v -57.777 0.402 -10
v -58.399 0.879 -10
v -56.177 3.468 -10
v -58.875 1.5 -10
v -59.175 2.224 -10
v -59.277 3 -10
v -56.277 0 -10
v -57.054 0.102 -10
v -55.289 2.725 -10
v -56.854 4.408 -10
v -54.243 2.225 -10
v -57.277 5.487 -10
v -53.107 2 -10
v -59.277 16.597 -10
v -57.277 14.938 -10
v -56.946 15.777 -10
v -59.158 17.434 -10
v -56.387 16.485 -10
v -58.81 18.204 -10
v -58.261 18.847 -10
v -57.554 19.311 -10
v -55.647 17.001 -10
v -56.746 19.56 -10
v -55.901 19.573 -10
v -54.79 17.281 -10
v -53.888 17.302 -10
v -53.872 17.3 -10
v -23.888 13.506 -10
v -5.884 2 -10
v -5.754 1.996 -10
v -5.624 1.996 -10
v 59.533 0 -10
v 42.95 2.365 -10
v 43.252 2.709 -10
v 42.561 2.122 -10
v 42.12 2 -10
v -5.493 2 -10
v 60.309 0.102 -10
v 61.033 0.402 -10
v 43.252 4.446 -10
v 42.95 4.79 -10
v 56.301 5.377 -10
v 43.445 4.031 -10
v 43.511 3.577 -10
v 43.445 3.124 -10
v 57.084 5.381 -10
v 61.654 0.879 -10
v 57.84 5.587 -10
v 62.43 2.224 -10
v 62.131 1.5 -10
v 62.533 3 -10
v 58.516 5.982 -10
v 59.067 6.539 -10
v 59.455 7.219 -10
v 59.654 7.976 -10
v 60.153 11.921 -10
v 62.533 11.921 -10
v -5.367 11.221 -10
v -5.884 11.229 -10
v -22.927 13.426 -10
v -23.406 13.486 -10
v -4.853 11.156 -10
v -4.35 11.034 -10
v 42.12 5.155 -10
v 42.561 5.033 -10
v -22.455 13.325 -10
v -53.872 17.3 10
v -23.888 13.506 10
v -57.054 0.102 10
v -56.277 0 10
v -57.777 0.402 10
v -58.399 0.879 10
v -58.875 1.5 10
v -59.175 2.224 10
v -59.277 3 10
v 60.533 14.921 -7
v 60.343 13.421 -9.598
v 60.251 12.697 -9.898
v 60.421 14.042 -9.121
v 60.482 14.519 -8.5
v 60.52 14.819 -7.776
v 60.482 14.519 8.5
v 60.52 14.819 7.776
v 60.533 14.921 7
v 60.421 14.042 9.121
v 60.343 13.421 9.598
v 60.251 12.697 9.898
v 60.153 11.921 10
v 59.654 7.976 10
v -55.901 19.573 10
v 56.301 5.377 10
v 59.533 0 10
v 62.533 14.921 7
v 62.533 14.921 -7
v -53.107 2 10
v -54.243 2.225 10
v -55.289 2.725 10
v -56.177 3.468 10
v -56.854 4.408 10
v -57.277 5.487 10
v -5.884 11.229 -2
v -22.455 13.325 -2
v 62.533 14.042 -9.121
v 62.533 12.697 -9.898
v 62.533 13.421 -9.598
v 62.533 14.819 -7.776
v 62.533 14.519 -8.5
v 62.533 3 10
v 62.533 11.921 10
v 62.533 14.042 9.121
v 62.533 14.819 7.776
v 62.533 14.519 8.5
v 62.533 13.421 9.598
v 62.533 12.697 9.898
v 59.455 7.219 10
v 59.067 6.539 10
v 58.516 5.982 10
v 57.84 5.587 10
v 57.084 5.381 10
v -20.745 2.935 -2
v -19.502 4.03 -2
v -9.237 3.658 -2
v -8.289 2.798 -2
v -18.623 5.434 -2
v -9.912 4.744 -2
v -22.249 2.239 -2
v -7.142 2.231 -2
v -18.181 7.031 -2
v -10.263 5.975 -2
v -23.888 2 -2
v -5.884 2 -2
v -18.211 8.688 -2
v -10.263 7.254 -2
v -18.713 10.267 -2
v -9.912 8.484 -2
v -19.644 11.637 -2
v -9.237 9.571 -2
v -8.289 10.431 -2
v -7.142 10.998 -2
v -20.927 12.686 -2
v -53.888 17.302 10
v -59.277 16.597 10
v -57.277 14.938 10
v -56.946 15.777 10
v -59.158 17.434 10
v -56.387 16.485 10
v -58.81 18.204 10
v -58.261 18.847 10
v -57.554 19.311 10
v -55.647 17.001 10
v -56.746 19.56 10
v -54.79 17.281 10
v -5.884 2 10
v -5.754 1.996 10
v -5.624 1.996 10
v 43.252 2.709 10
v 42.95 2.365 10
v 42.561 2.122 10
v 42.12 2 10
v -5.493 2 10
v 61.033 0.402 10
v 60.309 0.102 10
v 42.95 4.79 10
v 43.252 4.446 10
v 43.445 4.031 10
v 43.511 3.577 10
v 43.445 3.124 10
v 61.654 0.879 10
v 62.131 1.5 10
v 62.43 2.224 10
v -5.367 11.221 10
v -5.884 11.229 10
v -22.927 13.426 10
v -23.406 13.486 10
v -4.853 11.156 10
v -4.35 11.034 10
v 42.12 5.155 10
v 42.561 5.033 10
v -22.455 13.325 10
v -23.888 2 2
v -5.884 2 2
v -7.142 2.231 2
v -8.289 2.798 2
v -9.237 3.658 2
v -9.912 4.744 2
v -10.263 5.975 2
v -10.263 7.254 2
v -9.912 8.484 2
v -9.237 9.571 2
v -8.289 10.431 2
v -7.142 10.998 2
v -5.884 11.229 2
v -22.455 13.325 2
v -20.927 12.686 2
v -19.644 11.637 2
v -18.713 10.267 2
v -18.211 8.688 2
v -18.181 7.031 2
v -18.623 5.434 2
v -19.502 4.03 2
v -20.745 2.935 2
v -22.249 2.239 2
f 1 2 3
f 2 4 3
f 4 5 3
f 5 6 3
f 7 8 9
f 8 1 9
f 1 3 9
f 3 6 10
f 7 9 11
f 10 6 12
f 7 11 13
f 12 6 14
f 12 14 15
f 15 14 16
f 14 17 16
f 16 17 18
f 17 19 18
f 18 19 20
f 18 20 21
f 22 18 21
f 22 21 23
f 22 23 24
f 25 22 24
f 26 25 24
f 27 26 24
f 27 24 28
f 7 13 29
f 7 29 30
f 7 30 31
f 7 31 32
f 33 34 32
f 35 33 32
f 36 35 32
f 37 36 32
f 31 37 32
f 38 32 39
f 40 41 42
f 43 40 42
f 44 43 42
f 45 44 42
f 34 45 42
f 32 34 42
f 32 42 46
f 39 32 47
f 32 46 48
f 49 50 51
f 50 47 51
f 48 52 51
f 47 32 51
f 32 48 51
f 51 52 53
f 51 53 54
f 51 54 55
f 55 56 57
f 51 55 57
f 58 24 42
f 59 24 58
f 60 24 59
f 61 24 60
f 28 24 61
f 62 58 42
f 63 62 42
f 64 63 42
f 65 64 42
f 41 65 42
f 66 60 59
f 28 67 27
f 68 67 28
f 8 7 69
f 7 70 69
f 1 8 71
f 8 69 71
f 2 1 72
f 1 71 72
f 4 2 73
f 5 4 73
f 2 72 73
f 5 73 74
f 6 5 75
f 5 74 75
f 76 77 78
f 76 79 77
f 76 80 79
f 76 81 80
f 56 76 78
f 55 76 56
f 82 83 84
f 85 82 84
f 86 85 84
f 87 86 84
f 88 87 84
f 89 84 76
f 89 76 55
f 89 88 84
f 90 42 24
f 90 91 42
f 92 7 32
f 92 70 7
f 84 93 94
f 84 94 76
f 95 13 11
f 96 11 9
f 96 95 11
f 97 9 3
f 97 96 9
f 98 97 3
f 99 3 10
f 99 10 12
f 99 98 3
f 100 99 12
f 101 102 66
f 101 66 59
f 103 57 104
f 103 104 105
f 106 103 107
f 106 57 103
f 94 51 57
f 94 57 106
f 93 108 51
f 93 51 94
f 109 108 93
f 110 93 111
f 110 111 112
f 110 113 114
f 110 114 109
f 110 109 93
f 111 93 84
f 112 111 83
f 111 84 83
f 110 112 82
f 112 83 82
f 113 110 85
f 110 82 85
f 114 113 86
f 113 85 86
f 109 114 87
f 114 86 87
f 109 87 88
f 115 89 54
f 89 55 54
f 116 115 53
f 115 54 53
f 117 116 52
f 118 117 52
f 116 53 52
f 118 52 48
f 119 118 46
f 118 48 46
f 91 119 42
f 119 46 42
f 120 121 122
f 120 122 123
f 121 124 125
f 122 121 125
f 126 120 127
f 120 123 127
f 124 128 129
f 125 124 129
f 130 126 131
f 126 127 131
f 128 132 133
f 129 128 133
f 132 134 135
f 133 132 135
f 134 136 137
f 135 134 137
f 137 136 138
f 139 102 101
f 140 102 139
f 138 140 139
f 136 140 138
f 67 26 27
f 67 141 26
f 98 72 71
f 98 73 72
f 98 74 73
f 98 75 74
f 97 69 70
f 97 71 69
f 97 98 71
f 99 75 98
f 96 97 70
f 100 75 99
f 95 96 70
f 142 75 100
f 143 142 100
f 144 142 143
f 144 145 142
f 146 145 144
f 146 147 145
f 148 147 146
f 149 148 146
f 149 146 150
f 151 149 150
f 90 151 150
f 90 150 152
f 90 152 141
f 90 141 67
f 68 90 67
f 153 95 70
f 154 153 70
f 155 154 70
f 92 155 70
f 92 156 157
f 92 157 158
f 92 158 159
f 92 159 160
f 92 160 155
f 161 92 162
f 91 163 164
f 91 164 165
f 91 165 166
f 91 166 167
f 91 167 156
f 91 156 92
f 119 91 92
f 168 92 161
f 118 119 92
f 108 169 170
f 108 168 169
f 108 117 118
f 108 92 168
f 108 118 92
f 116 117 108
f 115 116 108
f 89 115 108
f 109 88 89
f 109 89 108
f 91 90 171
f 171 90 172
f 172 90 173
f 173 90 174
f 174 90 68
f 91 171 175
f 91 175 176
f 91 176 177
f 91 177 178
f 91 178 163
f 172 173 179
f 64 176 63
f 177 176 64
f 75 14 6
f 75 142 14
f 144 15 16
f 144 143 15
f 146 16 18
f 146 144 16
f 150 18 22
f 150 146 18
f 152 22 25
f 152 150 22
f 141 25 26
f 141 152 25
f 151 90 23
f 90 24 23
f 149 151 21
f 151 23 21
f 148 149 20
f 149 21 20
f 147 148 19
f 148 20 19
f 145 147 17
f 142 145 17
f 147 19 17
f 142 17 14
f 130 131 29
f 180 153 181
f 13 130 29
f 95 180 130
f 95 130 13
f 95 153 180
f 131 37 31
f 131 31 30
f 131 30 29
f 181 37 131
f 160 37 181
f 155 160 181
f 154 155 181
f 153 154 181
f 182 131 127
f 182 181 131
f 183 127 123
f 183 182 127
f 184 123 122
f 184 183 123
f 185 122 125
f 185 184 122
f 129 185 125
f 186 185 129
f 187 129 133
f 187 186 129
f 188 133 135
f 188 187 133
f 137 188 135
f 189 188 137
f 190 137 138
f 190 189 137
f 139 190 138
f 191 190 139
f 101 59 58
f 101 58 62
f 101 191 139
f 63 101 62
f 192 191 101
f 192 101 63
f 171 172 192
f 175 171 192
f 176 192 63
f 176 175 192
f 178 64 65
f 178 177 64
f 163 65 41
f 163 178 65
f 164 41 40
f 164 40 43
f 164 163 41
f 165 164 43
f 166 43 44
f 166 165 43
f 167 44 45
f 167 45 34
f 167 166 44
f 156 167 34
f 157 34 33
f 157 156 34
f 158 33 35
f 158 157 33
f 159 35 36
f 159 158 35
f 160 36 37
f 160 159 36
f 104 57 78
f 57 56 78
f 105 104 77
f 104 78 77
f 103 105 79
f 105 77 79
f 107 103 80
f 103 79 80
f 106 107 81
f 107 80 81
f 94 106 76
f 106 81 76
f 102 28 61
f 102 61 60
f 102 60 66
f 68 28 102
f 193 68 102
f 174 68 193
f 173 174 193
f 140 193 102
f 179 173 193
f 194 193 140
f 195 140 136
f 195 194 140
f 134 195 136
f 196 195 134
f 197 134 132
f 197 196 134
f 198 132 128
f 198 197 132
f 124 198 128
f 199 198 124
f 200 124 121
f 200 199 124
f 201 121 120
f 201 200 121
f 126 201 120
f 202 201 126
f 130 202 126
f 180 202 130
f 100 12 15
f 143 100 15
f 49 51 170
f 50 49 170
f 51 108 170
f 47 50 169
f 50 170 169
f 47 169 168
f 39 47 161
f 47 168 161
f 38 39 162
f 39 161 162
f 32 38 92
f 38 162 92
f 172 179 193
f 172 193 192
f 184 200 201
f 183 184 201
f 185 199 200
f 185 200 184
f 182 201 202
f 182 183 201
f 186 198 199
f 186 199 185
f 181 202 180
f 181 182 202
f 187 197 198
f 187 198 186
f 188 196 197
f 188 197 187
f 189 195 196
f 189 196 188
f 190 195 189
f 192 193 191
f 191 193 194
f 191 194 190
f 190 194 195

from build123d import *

# Parameters (mm, degrees)
F1_DEPTH      = 10
F1_DEPTH_BACK = 10
F2_DEPTH      = 2
F2_DEPTH_BACK = 2
F3_R          = 3


with BuildPart() as f1:
    # F0 (on Top) → F1 (new body, two sides)
    with BuildSketch(Plane.XY) as f1_sk:
        Polygon((-59.2774198156, 20), (-59.2774198156, 0), (59.2774198156, 0), (62.5326499412, 0), (62.5326499412, 14.9209070821), (60.5326499412, 14.9209070821), (59.2774198156, 5), align=None)
        with BuildLine():
            Line((-57.2774198156, 5.487030372), (-57.2774198156, 14.937681146))
            ThreePointArc((-57.2774198156, 14.937681146), (-56.0362820698, 16.769830707), (-53.888312773, 17.3022054044))
            Line((-53.888312773, 17.3022054044), (-53.8724083408, 17.3001931164))
            Line((-53.8724083408, 17.3001931164), (-23.888312773, 13.5064936359))
            ThreePointArc((-23.888312773, 13.5064936359), (-23.1661479004, 13.4609895281), (-22.4554066533, 13.3251970152))
            Line((-22.4554066533, 13.3251970152), (-5.8840475922, 11.2285269283))
            ThreePointArc((-5.8840475922, 11.2285269283), (-5.109007468, 11.1961309679), (-4.3503218976, 11.0344742393))
            Line((-4.3503218976, 11.0344742393), (42.1202175885, 5.1548484521))
            ThreePointArc((42.1202175885, 5.1548484521), (43.5106359985, 3.5774242261), (42.1202175885, 2))
            Line((42.1202175885, 2), (-5.4933972374, 2))
            ThreePointArc((-5.4933972374, 2), (-5.6887224148, 1.9958677209), (-5.8840475922, 2))
            Line((-5.8840475922, 2), (-23.888312773, 2))
            Line((-23.888312773, 2), (-53.1070120633, 2))
            ThreePointArc((-53.1070120633, 2), (-55.756346344, 3.0688282572), (-57.2774198156, 5.487030372))
        make_face(mode=Mode.SUBTRACT)
    extrude(amount=F1_DEPTH)
    extrude(f1_sk.sketch, amount=-F1_DEPTH_BACK)

    # F0 (on Top) → F2 (join, two sides)
    with BuildSketch(Plane.XY) as f2_sk:
        with BuildLine():
            ThreePointArc((-22.4554066533, 13.3251970152), (-18.1805700628, 7.0310819454), (-23.888312773, 2))
            Line((-23.888312773, 2), (-5.8840475922, 2))
            ThreePointArc((-5.8840475922, 2), (-10.3071181581, 6.6142634641), (-5.8840475922, 11.2285269283))
            Line((-5.8840475922, 11.2285269283), (-22.4554066533, 13.3251970152))
        make_face()
    extrude(amount=F2_DEPTH)
    extrude(f2_sk.sketch, amount=-F2_DEPTH_BACK)

    # F3
    f3_edges = [f1.edges().sort_by_distance(p)[0] for p in [
        (62.53265, 0, 0),
        (-59.27742, 0, 0),
        (-59.27742, 20, 0),
        (59.27742, 5, 0),
        (61.53265, 14.920907, -10),
        (61.53265, 14.920907, 10),
    ]]
    fillet(f3_edges, radius=F3_R)


solid = f1.part
